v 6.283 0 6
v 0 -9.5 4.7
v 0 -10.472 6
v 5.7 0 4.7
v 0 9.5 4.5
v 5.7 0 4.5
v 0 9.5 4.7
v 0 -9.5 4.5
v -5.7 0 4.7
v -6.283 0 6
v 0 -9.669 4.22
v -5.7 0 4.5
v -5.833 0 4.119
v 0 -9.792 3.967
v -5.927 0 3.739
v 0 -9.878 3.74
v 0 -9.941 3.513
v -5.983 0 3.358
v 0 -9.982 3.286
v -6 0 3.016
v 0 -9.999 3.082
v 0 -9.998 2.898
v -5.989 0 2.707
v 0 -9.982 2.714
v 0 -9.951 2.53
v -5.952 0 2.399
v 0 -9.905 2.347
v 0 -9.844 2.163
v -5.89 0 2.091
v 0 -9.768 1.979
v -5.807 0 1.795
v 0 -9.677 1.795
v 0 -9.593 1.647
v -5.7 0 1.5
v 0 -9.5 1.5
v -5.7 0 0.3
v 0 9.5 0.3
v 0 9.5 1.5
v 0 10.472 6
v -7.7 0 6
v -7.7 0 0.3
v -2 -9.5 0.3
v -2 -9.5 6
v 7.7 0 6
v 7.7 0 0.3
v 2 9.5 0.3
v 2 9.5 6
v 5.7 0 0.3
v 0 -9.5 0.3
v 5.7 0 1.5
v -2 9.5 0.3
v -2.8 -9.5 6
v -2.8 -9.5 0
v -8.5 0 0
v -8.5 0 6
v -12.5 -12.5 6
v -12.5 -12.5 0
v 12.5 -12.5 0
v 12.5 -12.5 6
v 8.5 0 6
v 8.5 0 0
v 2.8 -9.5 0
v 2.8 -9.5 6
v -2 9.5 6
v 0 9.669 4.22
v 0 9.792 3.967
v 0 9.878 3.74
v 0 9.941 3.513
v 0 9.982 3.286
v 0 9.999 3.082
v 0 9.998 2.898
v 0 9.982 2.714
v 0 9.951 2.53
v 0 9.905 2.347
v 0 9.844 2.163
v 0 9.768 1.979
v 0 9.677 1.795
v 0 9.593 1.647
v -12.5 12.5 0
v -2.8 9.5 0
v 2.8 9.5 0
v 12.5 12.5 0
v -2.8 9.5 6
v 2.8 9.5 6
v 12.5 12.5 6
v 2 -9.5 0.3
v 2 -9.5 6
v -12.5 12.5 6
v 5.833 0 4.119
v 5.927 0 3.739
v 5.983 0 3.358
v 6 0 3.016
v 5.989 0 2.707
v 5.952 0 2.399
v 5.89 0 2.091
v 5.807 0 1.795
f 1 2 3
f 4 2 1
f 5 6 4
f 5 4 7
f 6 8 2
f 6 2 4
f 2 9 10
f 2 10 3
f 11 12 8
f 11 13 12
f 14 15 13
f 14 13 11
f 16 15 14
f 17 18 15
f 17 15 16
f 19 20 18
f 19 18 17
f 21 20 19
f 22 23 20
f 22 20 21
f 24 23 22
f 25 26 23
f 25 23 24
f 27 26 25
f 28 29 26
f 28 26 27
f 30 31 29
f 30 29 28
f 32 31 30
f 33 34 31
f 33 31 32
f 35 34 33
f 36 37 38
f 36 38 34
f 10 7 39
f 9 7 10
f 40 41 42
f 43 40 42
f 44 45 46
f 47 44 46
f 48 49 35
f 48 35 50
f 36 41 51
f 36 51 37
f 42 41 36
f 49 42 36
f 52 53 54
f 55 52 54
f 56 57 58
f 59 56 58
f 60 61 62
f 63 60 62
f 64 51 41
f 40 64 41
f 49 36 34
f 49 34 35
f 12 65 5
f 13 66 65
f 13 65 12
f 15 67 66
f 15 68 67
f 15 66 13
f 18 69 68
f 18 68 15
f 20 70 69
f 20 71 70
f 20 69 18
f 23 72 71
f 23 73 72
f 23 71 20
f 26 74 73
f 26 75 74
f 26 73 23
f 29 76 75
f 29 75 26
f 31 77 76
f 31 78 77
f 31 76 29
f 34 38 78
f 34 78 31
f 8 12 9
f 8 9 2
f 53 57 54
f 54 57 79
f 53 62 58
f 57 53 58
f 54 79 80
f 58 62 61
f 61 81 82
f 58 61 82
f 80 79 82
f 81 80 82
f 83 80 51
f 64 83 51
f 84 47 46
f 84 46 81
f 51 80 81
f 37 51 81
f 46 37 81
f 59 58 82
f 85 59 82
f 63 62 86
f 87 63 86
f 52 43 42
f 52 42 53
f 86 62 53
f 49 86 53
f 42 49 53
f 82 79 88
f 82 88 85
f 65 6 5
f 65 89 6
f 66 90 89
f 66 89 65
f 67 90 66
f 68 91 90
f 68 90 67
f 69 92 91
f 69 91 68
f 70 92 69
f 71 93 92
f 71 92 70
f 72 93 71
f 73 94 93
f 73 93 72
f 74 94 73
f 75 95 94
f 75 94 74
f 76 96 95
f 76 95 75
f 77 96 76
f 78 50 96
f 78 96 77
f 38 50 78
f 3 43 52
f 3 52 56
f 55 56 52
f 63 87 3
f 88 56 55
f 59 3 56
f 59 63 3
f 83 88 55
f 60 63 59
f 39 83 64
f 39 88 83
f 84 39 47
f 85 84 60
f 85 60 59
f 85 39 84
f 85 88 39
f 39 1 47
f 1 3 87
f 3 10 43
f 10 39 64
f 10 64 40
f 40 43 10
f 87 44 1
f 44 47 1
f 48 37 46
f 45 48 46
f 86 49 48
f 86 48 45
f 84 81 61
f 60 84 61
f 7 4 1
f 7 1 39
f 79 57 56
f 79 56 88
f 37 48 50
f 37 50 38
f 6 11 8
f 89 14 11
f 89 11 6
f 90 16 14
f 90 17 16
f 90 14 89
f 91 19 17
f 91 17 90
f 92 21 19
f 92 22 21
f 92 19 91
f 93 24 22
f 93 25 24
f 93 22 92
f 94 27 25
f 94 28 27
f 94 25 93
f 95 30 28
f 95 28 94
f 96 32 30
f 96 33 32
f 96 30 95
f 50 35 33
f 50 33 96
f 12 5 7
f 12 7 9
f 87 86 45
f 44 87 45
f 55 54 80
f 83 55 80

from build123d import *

# Parameters (mm, degrees)
SKETCH_W      = 25
SKETCH_H      = 25
PAD_DEPTH     = 6
CHAMFER_SIZE2 = 1.3
CHAMFER_SIZE  = 0.5
POCKET_DEPTH  = 0.3


with BuildPart() as part:
    # Sketch (on XY_Plane of Origin) → Pad (new body)
    with BuildSketch(Plane.XY):
        Rectangle(SKETCH_W, SKETCH_H)
        Polygon((0, 9.5), (-5.7, 0), (0, -9.5), (5.7, 0), align=None, mode=Mode.SUBTRACT)
        Polygon((-2, 9.5), (-7.7, 0), (-2, -9.5), (-2.8, -9.5), (-8.5, 0), (-2.8, 9.5), align=None, mode=Mode.SUBTRACT)
        Polygon((2, -9.5), (7.7, 0), (2, 9.5), (2.8, 9.5), (8.5, 0), (2.8, -9.5), align=None, mode=Mode.SUBTRACT)
    extrude(amount=PAD_DEPTH)

    # Sketch002 (on Face22 of Pad) → SubtractiveLoft section 0
    with BuildSketch(Plane.XY.offset(4.5)):
        Polygon((-5.7, 0), (0, -9.5), (5.7, 0), (0, 9.5), align=None)
    # Sketch001 (on Face22 of Pad) → SubtractiveLoft section 1
    with BuildSketch(Plane.XY.offset(3)):
        Polygon((-6, 0), (0, 10), (6, 0), (0, -10), align=None)
    # Sketch003 (on Face22 of Pad) → SubtractiveLoft section 2
    with BuildSketch(Plane.XY.offset(1.5)):
        Polygon((-5.7, 0), (0, 9.5), (5.7, 0), (0, -9.5), align=None)
    loft(mode=Mode.SUBTRACT)

    # Chamfer
    chamfer_edges = [part.edges().sort_by_distance(p)[0] for p in [
        (2.85, 4.75, 6),
        (-2.85, 4.75, 6),
        (-2.85, -4.75, 6),
        (2.85, -4.75, 6),
    ]]
    chamfer_side = part.faces().sort_by_distance((-12.146447, 0, 6))[0]
    chamfer(chamfer_edges, length=CHAMFER_SIZE, length2=CHAMFER_SIZE2, reference=chamfer_side)

    # Sketch004 (on Face4 of SubtractiveLoft) → Pocket (cut)
    with BuildSketch(Plane(origin=(0, 0, 0), x_dir=(1, 0, 0), z_dir=(0, 0, -1))):
        Polygon((-8.5, 0), (-2.8, -9.5), (2.8, -9.5), (8.5, 0), (2.8, 9.5), (-2.8, 9.5), align=None)
    extrude(amount=-POCKET_DEPTH, mode=Mode.SUBTRACT)


solid = part.part
